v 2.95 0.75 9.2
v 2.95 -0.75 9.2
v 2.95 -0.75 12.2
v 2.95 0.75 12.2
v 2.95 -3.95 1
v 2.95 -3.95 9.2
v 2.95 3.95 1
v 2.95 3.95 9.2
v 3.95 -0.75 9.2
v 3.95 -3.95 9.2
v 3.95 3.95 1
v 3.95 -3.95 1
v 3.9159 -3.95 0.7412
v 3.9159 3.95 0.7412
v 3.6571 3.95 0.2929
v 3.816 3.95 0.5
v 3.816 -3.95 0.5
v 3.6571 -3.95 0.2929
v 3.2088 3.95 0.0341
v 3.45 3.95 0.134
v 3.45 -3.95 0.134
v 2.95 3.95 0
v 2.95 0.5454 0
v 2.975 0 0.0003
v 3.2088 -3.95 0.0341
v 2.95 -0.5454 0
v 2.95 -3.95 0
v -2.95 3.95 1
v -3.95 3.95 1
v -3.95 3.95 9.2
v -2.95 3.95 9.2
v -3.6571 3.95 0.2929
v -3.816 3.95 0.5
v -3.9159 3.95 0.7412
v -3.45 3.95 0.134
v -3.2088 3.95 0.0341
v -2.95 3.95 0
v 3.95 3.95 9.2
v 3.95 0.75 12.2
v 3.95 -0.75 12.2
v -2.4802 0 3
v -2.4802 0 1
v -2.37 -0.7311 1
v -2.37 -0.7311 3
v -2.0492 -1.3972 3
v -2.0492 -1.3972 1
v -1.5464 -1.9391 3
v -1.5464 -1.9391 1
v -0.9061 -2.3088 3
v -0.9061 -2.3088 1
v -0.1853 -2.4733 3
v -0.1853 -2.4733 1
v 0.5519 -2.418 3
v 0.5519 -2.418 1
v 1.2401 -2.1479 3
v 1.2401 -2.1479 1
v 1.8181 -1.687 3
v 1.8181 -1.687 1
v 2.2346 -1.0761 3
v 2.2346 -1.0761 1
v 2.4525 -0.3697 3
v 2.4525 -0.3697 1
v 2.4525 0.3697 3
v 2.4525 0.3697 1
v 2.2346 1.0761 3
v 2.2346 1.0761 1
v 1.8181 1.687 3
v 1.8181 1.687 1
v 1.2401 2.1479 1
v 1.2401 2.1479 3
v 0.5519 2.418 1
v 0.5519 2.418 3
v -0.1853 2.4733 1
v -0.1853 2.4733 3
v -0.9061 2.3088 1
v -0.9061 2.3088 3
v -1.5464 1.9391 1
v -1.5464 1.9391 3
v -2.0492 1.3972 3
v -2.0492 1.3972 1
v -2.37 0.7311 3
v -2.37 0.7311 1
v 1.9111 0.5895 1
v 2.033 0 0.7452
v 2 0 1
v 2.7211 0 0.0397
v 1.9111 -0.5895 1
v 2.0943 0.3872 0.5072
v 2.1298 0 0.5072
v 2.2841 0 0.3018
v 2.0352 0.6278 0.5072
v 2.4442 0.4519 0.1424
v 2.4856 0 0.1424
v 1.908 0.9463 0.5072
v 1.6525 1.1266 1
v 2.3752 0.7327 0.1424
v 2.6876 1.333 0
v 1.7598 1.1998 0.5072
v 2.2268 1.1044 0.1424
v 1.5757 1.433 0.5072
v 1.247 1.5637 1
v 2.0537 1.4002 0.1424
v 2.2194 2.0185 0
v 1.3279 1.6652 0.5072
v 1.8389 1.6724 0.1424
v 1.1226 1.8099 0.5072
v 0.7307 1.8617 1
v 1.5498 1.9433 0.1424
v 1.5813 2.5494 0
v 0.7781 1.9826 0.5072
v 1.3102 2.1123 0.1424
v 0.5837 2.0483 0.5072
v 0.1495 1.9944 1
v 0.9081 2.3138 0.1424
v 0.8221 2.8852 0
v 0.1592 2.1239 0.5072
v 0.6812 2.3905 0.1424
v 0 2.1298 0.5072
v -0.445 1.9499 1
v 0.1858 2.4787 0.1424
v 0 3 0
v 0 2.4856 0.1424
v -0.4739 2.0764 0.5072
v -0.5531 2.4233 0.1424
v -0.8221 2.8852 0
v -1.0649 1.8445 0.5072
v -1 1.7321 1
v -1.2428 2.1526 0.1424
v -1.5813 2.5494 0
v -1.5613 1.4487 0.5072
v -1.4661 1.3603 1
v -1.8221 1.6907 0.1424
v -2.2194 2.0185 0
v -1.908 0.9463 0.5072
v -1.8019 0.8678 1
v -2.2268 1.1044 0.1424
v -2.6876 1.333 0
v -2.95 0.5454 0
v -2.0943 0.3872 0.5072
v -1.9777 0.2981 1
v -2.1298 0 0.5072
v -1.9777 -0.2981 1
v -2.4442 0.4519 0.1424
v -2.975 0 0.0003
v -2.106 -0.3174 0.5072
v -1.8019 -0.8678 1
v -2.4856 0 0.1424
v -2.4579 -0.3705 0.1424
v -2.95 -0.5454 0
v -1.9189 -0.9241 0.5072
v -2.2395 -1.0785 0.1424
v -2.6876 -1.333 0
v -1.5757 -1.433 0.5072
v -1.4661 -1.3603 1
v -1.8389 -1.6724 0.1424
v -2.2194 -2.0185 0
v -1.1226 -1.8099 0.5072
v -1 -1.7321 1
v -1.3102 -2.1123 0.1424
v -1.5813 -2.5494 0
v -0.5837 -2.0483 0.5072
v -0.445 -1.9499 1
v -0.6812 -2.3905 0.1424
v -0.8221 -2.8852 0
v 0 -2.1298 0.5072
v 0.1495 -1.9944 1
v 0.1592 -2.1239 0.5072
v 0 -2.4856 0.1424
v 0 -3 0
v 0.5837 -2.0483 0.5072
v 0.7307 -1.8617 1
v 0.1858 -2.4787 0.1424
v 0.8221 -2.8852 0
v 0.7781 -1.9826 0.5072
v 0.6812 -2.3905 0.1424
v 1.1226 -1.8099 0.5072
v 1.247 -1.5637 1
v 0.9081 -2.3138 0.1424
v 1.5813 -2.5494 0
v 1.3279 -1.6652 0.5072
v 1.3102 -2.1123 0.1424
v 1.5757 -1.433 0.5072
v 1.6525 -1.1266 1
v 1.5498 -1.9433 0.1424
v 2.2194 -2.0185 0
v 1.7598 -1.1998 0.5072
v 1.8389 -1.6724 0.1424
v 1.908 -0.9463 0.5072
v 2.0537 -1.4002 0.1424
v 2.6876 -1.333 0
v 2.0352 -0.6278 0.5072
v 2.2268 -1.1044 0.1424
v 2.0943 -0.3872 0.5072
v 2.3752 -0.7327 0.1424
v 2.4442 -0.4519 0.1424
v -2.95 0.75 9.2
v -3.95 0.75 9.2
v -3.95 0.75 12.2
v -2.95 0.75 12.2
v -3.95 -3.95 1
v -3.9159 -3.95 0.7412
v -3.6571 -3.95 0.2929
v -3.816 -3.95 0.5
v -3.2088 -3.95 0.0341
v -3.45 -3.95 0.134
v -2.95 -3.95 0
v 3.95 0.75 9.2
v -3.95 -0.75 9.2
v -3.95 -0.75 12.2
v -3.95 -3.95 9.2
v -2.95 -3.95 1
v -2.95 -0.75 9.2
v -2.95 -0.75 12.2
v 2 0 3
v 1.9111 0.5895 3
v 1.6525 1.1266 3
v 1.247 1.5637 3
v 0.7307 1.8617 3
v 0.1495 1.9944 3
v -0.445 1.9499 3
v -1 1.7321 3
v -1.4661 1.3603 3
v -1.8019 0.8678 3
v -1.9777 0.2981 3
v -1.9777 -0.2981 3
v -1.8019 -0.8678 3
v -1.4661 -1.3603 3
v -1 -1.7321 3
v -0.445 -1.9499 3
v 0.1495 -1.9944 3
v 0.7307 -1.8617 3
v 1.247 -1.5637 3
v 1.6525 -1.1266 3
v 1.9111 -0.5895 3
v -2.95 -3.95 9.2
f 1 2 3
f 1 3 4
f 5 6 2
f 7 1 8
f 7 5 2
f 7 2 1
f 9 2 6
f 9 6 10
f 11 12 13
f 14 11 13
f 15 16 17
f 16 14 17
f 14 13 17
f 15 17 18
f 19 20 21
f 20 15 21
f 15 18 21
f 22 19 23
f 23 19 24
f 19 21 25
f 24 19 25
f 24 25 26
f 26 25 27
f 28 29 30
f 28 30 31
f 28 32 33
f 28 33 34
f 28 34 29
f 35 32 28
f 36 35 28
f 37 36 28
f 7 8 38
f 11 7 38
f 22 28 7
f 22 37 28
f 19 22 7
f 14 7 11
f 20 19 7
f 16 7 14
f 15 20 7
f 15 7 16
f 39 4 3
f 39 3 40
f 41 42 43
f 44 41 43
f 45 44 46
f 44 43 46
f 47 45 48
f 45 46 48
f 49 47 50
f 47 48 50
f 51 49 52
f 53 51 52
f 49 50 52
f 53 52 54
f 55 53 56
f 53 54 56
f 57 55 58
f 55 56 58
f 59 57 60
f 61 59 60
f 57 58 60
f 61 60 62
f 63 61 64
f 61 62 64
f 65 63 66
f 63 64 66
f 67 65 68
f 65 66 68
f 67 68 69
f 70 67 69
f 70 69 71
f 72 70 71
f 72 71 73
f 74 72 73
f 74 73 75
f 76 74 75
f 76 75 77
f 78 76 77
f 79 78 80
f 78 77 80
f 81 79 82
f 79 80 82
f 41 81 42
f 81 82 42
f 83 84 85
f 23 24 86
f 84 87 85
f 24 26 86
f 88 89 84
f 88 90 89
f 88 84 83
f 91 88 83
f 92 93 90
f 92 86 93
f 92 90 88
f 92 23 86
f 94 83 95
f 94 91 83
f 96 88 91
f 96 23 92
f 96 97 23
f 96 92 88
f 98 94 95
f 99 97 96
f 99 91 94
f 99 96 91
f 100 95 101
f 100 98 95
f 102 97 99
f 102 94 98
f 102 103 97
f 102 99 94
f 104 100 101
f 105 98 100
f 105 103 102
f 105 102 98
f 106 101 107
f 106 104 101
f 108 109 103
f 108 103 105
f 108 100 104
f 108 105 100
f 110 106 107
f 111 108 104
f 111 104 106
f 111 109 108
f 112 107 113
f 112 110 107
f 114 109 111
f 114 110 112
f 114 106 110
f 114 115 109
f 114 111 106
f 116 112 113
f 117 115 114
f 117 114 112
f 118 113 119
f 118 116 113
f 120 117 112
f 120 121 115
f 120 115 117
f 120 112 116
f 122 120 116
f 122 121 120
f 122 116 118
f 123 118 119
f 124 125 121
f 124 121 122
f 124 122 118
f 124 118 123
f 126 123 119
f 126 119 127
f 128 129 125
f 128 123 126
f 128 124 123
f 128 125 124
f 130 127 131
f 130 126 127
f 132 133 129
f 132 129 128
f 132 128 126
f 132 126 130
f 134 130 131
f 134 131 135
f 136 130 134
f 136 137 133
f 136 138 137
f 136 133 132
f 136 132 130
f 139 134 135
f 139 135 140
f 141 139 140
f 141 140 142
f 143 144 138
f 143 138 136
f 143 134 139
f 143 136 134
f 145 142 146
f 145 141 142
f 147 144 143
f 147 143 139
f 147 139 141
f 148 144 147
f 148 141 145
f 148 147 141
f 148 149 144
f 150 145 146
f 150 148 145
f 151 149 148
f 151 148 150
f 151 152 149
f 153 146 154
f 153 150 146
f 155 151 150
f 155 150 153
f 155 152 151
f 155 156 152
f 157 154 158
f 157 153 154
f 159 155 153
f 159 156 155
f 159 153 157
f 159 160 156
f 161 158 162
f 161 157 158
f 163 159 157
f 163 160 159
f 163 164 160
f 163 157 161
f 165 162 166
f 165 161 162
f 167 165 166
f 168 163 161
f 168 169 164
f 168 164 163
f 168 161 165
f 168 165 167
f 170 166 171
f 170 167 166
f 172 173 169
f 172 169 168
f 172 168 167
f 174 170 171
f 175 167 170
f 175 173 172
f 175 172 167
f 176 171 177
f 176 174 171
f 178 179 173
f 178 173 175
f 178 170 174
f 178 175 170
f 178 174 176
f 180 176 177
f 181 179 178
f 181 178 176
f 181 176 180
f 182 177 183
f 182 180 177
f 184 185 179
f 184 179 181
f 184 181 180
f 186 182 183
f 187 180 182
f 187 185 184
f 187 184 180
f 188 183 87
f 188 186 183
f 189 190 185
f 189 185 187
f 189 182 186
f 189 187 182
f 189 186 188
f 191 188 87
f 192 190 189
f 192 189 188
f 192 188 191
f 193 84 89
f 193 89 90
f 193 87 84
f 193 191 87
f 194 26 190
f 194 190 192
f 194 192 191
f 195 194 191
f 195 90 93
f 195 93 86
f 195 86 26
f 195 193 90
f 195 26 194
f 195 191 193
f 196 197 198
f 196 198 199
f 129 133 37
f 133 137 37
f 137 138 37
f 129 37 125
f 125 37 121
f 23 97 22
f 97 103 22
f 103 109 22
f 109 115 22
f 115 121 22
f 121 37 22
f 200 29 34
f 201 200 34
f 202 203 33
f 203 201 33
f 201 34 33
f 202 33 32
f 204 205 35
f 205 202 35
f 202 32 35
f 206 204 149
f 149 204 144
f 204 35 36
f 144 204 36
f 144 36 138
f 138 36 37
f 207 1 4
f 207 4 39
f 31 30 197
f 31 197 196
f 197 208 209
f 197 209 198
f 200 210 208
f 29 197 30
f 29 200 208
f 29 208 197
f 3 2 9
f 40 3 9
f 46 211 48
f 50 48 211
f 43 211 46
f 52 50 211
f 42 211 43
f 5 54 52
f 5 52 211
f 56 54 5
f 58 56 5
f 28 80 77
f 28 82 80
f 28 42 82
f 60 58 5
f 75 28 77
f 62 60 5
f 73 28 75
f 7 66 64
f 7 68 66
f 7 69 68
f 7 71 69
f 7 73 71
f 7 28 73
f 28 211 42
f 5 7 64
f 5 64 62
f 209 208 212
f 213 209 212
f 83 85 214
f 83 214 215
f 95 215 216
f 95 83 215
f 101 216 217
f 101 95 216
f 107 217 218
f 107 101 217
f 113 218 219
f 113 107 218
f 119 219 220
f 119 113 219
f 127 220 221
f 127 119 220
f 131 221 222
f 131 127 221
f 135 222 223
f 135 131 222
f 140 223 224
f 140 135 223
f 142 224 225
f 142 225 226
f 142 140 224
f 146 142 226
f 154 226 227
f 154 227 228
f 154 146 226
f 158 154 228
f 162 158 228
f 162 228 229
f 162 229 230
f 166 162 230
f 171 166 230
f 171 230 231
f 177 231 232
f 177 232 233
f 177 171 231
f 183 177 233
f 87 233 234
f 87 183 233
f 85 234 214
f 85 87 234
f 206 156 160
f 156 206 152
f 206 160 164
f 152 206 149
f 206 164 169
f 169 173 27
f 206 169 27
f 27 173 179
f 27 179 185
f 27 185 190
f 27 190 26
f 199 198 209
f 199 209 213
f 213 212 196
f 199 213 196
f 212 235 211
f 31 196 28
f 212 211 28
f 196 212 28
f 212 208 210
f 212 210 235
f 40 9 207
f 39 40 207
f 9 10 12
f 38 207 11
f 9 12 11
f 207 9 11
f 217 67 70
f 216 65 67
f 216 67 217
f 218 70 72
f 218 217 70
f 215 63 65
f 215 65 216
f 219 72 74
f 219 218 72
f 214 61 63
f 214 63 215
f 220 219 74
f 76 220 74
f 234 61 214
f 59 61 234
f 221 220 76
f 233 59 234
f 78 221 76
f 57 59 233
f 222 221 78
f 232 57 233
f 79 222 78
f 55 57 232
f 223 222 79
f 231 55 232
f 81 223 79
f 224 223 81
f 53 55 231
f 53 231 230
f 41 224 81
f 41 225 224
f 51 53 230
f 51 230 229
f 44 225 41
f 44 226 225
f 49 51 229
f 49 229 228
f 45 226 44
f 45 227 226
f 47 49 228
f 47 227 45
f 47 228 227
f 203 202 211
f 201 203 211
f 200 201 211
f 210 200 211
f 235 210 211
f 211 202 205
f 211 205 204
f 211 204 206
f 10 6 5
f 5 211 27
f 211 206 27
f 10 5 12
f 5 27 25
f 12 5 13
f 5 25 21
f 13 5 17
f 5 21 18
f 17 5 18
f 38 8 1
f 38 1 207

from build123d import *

# Parameters (mm, degrees)
SKETCH_1_W      = 7.9
SKETCH_1_H      = 7.9
SKETCH_1_R      = 2
EXTRUDE_1_DEPTH = 1
SKETCH_2_W      = 1
SKETCH_2_H      = 7.9
EXTRUDE_2_DEPTH = 9.2
SKETCH_3_W      = 1
SKETCH_3_H      = 1.5
EXTRUDE_3_DEPTH = 3
SKETCH_4_R      = 2.480212027
SKETCH_4_R_2    = 2
EXTRUDE_4_DEPTH = 2
FILLET_2_R      = 1


with BuildPart() as part:
    # 草图1 → 凸台-拉伸1 (new body)
    with BuildSketch(Plane.XY):
        Rectangle(SKETCH_1_W, SKETCH_1_H)
        Circle(SKETCH_1_R, mode=Mode.SUBTRACT)
    extrude(amount=EXTRUDE_1_DEPTH)

    # 草图2 → 凸台-拉伸2 (add)
    with BuildSketch(Plane.XY):
        with Locations((-3.45, 0)):
            Rectangle(SKETCH_2_W, SKETCH_2_H)
        with Locations((3.45, 0)):
            Rectangle(SKETCH_2_W, SKETCH_2_H)
    extrude(amount=EXTRUDE_2_DEPTH)

    # 草图3 → 凸台-拉伸3 (add)
    with BuildSketch(Plane.XY.offset(9.2)):
        with Locations((-3.45, 0)):
            Rectangle(SKETCH_3_W, SKETCH_3_H)
        with Locations((3.45, 0)):
            Rectangle(SKETCH_3_W, SKETCH_3_H)
    extrude(amount=EXTRUDE_3_DEPTH)

    # 草图4 → 凸台-拉伸4 (add)
    with BuildSketch(Plane.XY.offset(1)):
        with Locations(Location((0, 0, 0), (0, 0, 180))):
            Circle(SKETCH_4_R)
        Circle(SKETCH_4_R_2, mode=Mode.SUBTRACT)
    extrude(amount=EXTRUDE_4_DEPTH)

    # 圆角2
    # the kernel refuses this fillet: 1 mm, written as the material it takes off along each edge
    with BuildSketch(Plane(origin=(0, 0, 0), x_dir=(1, 0, 0), z_dir=(0, -1, 0))) as fillet_2_piece_1:
        with BuildLine():
            CenterArc((2 + FILLET_2_R, FILLET_2_R), FILLET_2_R, 180, 90)
            Line((2 + FILLET_2_R, 0), (2, 0))
            Line((2, 0), (2, FILLET_2_R))
        make_face()
    revolve(axis=Axis((0, 0, 0), (0, 0, 1)), mode=Mode.SUBTRACT)
    with BuildSketch(Plane(origin=(-3.95, 6.45, 0), x_dir=(0, 0, 1), z_dir=(0, -1, 0)), Plane(origin=(3.95, -6.45, 0), x_dir=(0, 0, 1), z_dir=(0, 1, 0))) as fillet_2_piece_2:
        with BuildLine():
            CenterArc((FILLET_2_R, -FILLET_2_R), FILLET_2_R, 90, 90)
            Line((0, -FILLET_2_R), (0, 0))
            Line((0, 0), (FILLET_2_R, 0))
        make_face()
    extrude(amount=12.9, mode=Mode.SUBTRACT)


solid = part.part
